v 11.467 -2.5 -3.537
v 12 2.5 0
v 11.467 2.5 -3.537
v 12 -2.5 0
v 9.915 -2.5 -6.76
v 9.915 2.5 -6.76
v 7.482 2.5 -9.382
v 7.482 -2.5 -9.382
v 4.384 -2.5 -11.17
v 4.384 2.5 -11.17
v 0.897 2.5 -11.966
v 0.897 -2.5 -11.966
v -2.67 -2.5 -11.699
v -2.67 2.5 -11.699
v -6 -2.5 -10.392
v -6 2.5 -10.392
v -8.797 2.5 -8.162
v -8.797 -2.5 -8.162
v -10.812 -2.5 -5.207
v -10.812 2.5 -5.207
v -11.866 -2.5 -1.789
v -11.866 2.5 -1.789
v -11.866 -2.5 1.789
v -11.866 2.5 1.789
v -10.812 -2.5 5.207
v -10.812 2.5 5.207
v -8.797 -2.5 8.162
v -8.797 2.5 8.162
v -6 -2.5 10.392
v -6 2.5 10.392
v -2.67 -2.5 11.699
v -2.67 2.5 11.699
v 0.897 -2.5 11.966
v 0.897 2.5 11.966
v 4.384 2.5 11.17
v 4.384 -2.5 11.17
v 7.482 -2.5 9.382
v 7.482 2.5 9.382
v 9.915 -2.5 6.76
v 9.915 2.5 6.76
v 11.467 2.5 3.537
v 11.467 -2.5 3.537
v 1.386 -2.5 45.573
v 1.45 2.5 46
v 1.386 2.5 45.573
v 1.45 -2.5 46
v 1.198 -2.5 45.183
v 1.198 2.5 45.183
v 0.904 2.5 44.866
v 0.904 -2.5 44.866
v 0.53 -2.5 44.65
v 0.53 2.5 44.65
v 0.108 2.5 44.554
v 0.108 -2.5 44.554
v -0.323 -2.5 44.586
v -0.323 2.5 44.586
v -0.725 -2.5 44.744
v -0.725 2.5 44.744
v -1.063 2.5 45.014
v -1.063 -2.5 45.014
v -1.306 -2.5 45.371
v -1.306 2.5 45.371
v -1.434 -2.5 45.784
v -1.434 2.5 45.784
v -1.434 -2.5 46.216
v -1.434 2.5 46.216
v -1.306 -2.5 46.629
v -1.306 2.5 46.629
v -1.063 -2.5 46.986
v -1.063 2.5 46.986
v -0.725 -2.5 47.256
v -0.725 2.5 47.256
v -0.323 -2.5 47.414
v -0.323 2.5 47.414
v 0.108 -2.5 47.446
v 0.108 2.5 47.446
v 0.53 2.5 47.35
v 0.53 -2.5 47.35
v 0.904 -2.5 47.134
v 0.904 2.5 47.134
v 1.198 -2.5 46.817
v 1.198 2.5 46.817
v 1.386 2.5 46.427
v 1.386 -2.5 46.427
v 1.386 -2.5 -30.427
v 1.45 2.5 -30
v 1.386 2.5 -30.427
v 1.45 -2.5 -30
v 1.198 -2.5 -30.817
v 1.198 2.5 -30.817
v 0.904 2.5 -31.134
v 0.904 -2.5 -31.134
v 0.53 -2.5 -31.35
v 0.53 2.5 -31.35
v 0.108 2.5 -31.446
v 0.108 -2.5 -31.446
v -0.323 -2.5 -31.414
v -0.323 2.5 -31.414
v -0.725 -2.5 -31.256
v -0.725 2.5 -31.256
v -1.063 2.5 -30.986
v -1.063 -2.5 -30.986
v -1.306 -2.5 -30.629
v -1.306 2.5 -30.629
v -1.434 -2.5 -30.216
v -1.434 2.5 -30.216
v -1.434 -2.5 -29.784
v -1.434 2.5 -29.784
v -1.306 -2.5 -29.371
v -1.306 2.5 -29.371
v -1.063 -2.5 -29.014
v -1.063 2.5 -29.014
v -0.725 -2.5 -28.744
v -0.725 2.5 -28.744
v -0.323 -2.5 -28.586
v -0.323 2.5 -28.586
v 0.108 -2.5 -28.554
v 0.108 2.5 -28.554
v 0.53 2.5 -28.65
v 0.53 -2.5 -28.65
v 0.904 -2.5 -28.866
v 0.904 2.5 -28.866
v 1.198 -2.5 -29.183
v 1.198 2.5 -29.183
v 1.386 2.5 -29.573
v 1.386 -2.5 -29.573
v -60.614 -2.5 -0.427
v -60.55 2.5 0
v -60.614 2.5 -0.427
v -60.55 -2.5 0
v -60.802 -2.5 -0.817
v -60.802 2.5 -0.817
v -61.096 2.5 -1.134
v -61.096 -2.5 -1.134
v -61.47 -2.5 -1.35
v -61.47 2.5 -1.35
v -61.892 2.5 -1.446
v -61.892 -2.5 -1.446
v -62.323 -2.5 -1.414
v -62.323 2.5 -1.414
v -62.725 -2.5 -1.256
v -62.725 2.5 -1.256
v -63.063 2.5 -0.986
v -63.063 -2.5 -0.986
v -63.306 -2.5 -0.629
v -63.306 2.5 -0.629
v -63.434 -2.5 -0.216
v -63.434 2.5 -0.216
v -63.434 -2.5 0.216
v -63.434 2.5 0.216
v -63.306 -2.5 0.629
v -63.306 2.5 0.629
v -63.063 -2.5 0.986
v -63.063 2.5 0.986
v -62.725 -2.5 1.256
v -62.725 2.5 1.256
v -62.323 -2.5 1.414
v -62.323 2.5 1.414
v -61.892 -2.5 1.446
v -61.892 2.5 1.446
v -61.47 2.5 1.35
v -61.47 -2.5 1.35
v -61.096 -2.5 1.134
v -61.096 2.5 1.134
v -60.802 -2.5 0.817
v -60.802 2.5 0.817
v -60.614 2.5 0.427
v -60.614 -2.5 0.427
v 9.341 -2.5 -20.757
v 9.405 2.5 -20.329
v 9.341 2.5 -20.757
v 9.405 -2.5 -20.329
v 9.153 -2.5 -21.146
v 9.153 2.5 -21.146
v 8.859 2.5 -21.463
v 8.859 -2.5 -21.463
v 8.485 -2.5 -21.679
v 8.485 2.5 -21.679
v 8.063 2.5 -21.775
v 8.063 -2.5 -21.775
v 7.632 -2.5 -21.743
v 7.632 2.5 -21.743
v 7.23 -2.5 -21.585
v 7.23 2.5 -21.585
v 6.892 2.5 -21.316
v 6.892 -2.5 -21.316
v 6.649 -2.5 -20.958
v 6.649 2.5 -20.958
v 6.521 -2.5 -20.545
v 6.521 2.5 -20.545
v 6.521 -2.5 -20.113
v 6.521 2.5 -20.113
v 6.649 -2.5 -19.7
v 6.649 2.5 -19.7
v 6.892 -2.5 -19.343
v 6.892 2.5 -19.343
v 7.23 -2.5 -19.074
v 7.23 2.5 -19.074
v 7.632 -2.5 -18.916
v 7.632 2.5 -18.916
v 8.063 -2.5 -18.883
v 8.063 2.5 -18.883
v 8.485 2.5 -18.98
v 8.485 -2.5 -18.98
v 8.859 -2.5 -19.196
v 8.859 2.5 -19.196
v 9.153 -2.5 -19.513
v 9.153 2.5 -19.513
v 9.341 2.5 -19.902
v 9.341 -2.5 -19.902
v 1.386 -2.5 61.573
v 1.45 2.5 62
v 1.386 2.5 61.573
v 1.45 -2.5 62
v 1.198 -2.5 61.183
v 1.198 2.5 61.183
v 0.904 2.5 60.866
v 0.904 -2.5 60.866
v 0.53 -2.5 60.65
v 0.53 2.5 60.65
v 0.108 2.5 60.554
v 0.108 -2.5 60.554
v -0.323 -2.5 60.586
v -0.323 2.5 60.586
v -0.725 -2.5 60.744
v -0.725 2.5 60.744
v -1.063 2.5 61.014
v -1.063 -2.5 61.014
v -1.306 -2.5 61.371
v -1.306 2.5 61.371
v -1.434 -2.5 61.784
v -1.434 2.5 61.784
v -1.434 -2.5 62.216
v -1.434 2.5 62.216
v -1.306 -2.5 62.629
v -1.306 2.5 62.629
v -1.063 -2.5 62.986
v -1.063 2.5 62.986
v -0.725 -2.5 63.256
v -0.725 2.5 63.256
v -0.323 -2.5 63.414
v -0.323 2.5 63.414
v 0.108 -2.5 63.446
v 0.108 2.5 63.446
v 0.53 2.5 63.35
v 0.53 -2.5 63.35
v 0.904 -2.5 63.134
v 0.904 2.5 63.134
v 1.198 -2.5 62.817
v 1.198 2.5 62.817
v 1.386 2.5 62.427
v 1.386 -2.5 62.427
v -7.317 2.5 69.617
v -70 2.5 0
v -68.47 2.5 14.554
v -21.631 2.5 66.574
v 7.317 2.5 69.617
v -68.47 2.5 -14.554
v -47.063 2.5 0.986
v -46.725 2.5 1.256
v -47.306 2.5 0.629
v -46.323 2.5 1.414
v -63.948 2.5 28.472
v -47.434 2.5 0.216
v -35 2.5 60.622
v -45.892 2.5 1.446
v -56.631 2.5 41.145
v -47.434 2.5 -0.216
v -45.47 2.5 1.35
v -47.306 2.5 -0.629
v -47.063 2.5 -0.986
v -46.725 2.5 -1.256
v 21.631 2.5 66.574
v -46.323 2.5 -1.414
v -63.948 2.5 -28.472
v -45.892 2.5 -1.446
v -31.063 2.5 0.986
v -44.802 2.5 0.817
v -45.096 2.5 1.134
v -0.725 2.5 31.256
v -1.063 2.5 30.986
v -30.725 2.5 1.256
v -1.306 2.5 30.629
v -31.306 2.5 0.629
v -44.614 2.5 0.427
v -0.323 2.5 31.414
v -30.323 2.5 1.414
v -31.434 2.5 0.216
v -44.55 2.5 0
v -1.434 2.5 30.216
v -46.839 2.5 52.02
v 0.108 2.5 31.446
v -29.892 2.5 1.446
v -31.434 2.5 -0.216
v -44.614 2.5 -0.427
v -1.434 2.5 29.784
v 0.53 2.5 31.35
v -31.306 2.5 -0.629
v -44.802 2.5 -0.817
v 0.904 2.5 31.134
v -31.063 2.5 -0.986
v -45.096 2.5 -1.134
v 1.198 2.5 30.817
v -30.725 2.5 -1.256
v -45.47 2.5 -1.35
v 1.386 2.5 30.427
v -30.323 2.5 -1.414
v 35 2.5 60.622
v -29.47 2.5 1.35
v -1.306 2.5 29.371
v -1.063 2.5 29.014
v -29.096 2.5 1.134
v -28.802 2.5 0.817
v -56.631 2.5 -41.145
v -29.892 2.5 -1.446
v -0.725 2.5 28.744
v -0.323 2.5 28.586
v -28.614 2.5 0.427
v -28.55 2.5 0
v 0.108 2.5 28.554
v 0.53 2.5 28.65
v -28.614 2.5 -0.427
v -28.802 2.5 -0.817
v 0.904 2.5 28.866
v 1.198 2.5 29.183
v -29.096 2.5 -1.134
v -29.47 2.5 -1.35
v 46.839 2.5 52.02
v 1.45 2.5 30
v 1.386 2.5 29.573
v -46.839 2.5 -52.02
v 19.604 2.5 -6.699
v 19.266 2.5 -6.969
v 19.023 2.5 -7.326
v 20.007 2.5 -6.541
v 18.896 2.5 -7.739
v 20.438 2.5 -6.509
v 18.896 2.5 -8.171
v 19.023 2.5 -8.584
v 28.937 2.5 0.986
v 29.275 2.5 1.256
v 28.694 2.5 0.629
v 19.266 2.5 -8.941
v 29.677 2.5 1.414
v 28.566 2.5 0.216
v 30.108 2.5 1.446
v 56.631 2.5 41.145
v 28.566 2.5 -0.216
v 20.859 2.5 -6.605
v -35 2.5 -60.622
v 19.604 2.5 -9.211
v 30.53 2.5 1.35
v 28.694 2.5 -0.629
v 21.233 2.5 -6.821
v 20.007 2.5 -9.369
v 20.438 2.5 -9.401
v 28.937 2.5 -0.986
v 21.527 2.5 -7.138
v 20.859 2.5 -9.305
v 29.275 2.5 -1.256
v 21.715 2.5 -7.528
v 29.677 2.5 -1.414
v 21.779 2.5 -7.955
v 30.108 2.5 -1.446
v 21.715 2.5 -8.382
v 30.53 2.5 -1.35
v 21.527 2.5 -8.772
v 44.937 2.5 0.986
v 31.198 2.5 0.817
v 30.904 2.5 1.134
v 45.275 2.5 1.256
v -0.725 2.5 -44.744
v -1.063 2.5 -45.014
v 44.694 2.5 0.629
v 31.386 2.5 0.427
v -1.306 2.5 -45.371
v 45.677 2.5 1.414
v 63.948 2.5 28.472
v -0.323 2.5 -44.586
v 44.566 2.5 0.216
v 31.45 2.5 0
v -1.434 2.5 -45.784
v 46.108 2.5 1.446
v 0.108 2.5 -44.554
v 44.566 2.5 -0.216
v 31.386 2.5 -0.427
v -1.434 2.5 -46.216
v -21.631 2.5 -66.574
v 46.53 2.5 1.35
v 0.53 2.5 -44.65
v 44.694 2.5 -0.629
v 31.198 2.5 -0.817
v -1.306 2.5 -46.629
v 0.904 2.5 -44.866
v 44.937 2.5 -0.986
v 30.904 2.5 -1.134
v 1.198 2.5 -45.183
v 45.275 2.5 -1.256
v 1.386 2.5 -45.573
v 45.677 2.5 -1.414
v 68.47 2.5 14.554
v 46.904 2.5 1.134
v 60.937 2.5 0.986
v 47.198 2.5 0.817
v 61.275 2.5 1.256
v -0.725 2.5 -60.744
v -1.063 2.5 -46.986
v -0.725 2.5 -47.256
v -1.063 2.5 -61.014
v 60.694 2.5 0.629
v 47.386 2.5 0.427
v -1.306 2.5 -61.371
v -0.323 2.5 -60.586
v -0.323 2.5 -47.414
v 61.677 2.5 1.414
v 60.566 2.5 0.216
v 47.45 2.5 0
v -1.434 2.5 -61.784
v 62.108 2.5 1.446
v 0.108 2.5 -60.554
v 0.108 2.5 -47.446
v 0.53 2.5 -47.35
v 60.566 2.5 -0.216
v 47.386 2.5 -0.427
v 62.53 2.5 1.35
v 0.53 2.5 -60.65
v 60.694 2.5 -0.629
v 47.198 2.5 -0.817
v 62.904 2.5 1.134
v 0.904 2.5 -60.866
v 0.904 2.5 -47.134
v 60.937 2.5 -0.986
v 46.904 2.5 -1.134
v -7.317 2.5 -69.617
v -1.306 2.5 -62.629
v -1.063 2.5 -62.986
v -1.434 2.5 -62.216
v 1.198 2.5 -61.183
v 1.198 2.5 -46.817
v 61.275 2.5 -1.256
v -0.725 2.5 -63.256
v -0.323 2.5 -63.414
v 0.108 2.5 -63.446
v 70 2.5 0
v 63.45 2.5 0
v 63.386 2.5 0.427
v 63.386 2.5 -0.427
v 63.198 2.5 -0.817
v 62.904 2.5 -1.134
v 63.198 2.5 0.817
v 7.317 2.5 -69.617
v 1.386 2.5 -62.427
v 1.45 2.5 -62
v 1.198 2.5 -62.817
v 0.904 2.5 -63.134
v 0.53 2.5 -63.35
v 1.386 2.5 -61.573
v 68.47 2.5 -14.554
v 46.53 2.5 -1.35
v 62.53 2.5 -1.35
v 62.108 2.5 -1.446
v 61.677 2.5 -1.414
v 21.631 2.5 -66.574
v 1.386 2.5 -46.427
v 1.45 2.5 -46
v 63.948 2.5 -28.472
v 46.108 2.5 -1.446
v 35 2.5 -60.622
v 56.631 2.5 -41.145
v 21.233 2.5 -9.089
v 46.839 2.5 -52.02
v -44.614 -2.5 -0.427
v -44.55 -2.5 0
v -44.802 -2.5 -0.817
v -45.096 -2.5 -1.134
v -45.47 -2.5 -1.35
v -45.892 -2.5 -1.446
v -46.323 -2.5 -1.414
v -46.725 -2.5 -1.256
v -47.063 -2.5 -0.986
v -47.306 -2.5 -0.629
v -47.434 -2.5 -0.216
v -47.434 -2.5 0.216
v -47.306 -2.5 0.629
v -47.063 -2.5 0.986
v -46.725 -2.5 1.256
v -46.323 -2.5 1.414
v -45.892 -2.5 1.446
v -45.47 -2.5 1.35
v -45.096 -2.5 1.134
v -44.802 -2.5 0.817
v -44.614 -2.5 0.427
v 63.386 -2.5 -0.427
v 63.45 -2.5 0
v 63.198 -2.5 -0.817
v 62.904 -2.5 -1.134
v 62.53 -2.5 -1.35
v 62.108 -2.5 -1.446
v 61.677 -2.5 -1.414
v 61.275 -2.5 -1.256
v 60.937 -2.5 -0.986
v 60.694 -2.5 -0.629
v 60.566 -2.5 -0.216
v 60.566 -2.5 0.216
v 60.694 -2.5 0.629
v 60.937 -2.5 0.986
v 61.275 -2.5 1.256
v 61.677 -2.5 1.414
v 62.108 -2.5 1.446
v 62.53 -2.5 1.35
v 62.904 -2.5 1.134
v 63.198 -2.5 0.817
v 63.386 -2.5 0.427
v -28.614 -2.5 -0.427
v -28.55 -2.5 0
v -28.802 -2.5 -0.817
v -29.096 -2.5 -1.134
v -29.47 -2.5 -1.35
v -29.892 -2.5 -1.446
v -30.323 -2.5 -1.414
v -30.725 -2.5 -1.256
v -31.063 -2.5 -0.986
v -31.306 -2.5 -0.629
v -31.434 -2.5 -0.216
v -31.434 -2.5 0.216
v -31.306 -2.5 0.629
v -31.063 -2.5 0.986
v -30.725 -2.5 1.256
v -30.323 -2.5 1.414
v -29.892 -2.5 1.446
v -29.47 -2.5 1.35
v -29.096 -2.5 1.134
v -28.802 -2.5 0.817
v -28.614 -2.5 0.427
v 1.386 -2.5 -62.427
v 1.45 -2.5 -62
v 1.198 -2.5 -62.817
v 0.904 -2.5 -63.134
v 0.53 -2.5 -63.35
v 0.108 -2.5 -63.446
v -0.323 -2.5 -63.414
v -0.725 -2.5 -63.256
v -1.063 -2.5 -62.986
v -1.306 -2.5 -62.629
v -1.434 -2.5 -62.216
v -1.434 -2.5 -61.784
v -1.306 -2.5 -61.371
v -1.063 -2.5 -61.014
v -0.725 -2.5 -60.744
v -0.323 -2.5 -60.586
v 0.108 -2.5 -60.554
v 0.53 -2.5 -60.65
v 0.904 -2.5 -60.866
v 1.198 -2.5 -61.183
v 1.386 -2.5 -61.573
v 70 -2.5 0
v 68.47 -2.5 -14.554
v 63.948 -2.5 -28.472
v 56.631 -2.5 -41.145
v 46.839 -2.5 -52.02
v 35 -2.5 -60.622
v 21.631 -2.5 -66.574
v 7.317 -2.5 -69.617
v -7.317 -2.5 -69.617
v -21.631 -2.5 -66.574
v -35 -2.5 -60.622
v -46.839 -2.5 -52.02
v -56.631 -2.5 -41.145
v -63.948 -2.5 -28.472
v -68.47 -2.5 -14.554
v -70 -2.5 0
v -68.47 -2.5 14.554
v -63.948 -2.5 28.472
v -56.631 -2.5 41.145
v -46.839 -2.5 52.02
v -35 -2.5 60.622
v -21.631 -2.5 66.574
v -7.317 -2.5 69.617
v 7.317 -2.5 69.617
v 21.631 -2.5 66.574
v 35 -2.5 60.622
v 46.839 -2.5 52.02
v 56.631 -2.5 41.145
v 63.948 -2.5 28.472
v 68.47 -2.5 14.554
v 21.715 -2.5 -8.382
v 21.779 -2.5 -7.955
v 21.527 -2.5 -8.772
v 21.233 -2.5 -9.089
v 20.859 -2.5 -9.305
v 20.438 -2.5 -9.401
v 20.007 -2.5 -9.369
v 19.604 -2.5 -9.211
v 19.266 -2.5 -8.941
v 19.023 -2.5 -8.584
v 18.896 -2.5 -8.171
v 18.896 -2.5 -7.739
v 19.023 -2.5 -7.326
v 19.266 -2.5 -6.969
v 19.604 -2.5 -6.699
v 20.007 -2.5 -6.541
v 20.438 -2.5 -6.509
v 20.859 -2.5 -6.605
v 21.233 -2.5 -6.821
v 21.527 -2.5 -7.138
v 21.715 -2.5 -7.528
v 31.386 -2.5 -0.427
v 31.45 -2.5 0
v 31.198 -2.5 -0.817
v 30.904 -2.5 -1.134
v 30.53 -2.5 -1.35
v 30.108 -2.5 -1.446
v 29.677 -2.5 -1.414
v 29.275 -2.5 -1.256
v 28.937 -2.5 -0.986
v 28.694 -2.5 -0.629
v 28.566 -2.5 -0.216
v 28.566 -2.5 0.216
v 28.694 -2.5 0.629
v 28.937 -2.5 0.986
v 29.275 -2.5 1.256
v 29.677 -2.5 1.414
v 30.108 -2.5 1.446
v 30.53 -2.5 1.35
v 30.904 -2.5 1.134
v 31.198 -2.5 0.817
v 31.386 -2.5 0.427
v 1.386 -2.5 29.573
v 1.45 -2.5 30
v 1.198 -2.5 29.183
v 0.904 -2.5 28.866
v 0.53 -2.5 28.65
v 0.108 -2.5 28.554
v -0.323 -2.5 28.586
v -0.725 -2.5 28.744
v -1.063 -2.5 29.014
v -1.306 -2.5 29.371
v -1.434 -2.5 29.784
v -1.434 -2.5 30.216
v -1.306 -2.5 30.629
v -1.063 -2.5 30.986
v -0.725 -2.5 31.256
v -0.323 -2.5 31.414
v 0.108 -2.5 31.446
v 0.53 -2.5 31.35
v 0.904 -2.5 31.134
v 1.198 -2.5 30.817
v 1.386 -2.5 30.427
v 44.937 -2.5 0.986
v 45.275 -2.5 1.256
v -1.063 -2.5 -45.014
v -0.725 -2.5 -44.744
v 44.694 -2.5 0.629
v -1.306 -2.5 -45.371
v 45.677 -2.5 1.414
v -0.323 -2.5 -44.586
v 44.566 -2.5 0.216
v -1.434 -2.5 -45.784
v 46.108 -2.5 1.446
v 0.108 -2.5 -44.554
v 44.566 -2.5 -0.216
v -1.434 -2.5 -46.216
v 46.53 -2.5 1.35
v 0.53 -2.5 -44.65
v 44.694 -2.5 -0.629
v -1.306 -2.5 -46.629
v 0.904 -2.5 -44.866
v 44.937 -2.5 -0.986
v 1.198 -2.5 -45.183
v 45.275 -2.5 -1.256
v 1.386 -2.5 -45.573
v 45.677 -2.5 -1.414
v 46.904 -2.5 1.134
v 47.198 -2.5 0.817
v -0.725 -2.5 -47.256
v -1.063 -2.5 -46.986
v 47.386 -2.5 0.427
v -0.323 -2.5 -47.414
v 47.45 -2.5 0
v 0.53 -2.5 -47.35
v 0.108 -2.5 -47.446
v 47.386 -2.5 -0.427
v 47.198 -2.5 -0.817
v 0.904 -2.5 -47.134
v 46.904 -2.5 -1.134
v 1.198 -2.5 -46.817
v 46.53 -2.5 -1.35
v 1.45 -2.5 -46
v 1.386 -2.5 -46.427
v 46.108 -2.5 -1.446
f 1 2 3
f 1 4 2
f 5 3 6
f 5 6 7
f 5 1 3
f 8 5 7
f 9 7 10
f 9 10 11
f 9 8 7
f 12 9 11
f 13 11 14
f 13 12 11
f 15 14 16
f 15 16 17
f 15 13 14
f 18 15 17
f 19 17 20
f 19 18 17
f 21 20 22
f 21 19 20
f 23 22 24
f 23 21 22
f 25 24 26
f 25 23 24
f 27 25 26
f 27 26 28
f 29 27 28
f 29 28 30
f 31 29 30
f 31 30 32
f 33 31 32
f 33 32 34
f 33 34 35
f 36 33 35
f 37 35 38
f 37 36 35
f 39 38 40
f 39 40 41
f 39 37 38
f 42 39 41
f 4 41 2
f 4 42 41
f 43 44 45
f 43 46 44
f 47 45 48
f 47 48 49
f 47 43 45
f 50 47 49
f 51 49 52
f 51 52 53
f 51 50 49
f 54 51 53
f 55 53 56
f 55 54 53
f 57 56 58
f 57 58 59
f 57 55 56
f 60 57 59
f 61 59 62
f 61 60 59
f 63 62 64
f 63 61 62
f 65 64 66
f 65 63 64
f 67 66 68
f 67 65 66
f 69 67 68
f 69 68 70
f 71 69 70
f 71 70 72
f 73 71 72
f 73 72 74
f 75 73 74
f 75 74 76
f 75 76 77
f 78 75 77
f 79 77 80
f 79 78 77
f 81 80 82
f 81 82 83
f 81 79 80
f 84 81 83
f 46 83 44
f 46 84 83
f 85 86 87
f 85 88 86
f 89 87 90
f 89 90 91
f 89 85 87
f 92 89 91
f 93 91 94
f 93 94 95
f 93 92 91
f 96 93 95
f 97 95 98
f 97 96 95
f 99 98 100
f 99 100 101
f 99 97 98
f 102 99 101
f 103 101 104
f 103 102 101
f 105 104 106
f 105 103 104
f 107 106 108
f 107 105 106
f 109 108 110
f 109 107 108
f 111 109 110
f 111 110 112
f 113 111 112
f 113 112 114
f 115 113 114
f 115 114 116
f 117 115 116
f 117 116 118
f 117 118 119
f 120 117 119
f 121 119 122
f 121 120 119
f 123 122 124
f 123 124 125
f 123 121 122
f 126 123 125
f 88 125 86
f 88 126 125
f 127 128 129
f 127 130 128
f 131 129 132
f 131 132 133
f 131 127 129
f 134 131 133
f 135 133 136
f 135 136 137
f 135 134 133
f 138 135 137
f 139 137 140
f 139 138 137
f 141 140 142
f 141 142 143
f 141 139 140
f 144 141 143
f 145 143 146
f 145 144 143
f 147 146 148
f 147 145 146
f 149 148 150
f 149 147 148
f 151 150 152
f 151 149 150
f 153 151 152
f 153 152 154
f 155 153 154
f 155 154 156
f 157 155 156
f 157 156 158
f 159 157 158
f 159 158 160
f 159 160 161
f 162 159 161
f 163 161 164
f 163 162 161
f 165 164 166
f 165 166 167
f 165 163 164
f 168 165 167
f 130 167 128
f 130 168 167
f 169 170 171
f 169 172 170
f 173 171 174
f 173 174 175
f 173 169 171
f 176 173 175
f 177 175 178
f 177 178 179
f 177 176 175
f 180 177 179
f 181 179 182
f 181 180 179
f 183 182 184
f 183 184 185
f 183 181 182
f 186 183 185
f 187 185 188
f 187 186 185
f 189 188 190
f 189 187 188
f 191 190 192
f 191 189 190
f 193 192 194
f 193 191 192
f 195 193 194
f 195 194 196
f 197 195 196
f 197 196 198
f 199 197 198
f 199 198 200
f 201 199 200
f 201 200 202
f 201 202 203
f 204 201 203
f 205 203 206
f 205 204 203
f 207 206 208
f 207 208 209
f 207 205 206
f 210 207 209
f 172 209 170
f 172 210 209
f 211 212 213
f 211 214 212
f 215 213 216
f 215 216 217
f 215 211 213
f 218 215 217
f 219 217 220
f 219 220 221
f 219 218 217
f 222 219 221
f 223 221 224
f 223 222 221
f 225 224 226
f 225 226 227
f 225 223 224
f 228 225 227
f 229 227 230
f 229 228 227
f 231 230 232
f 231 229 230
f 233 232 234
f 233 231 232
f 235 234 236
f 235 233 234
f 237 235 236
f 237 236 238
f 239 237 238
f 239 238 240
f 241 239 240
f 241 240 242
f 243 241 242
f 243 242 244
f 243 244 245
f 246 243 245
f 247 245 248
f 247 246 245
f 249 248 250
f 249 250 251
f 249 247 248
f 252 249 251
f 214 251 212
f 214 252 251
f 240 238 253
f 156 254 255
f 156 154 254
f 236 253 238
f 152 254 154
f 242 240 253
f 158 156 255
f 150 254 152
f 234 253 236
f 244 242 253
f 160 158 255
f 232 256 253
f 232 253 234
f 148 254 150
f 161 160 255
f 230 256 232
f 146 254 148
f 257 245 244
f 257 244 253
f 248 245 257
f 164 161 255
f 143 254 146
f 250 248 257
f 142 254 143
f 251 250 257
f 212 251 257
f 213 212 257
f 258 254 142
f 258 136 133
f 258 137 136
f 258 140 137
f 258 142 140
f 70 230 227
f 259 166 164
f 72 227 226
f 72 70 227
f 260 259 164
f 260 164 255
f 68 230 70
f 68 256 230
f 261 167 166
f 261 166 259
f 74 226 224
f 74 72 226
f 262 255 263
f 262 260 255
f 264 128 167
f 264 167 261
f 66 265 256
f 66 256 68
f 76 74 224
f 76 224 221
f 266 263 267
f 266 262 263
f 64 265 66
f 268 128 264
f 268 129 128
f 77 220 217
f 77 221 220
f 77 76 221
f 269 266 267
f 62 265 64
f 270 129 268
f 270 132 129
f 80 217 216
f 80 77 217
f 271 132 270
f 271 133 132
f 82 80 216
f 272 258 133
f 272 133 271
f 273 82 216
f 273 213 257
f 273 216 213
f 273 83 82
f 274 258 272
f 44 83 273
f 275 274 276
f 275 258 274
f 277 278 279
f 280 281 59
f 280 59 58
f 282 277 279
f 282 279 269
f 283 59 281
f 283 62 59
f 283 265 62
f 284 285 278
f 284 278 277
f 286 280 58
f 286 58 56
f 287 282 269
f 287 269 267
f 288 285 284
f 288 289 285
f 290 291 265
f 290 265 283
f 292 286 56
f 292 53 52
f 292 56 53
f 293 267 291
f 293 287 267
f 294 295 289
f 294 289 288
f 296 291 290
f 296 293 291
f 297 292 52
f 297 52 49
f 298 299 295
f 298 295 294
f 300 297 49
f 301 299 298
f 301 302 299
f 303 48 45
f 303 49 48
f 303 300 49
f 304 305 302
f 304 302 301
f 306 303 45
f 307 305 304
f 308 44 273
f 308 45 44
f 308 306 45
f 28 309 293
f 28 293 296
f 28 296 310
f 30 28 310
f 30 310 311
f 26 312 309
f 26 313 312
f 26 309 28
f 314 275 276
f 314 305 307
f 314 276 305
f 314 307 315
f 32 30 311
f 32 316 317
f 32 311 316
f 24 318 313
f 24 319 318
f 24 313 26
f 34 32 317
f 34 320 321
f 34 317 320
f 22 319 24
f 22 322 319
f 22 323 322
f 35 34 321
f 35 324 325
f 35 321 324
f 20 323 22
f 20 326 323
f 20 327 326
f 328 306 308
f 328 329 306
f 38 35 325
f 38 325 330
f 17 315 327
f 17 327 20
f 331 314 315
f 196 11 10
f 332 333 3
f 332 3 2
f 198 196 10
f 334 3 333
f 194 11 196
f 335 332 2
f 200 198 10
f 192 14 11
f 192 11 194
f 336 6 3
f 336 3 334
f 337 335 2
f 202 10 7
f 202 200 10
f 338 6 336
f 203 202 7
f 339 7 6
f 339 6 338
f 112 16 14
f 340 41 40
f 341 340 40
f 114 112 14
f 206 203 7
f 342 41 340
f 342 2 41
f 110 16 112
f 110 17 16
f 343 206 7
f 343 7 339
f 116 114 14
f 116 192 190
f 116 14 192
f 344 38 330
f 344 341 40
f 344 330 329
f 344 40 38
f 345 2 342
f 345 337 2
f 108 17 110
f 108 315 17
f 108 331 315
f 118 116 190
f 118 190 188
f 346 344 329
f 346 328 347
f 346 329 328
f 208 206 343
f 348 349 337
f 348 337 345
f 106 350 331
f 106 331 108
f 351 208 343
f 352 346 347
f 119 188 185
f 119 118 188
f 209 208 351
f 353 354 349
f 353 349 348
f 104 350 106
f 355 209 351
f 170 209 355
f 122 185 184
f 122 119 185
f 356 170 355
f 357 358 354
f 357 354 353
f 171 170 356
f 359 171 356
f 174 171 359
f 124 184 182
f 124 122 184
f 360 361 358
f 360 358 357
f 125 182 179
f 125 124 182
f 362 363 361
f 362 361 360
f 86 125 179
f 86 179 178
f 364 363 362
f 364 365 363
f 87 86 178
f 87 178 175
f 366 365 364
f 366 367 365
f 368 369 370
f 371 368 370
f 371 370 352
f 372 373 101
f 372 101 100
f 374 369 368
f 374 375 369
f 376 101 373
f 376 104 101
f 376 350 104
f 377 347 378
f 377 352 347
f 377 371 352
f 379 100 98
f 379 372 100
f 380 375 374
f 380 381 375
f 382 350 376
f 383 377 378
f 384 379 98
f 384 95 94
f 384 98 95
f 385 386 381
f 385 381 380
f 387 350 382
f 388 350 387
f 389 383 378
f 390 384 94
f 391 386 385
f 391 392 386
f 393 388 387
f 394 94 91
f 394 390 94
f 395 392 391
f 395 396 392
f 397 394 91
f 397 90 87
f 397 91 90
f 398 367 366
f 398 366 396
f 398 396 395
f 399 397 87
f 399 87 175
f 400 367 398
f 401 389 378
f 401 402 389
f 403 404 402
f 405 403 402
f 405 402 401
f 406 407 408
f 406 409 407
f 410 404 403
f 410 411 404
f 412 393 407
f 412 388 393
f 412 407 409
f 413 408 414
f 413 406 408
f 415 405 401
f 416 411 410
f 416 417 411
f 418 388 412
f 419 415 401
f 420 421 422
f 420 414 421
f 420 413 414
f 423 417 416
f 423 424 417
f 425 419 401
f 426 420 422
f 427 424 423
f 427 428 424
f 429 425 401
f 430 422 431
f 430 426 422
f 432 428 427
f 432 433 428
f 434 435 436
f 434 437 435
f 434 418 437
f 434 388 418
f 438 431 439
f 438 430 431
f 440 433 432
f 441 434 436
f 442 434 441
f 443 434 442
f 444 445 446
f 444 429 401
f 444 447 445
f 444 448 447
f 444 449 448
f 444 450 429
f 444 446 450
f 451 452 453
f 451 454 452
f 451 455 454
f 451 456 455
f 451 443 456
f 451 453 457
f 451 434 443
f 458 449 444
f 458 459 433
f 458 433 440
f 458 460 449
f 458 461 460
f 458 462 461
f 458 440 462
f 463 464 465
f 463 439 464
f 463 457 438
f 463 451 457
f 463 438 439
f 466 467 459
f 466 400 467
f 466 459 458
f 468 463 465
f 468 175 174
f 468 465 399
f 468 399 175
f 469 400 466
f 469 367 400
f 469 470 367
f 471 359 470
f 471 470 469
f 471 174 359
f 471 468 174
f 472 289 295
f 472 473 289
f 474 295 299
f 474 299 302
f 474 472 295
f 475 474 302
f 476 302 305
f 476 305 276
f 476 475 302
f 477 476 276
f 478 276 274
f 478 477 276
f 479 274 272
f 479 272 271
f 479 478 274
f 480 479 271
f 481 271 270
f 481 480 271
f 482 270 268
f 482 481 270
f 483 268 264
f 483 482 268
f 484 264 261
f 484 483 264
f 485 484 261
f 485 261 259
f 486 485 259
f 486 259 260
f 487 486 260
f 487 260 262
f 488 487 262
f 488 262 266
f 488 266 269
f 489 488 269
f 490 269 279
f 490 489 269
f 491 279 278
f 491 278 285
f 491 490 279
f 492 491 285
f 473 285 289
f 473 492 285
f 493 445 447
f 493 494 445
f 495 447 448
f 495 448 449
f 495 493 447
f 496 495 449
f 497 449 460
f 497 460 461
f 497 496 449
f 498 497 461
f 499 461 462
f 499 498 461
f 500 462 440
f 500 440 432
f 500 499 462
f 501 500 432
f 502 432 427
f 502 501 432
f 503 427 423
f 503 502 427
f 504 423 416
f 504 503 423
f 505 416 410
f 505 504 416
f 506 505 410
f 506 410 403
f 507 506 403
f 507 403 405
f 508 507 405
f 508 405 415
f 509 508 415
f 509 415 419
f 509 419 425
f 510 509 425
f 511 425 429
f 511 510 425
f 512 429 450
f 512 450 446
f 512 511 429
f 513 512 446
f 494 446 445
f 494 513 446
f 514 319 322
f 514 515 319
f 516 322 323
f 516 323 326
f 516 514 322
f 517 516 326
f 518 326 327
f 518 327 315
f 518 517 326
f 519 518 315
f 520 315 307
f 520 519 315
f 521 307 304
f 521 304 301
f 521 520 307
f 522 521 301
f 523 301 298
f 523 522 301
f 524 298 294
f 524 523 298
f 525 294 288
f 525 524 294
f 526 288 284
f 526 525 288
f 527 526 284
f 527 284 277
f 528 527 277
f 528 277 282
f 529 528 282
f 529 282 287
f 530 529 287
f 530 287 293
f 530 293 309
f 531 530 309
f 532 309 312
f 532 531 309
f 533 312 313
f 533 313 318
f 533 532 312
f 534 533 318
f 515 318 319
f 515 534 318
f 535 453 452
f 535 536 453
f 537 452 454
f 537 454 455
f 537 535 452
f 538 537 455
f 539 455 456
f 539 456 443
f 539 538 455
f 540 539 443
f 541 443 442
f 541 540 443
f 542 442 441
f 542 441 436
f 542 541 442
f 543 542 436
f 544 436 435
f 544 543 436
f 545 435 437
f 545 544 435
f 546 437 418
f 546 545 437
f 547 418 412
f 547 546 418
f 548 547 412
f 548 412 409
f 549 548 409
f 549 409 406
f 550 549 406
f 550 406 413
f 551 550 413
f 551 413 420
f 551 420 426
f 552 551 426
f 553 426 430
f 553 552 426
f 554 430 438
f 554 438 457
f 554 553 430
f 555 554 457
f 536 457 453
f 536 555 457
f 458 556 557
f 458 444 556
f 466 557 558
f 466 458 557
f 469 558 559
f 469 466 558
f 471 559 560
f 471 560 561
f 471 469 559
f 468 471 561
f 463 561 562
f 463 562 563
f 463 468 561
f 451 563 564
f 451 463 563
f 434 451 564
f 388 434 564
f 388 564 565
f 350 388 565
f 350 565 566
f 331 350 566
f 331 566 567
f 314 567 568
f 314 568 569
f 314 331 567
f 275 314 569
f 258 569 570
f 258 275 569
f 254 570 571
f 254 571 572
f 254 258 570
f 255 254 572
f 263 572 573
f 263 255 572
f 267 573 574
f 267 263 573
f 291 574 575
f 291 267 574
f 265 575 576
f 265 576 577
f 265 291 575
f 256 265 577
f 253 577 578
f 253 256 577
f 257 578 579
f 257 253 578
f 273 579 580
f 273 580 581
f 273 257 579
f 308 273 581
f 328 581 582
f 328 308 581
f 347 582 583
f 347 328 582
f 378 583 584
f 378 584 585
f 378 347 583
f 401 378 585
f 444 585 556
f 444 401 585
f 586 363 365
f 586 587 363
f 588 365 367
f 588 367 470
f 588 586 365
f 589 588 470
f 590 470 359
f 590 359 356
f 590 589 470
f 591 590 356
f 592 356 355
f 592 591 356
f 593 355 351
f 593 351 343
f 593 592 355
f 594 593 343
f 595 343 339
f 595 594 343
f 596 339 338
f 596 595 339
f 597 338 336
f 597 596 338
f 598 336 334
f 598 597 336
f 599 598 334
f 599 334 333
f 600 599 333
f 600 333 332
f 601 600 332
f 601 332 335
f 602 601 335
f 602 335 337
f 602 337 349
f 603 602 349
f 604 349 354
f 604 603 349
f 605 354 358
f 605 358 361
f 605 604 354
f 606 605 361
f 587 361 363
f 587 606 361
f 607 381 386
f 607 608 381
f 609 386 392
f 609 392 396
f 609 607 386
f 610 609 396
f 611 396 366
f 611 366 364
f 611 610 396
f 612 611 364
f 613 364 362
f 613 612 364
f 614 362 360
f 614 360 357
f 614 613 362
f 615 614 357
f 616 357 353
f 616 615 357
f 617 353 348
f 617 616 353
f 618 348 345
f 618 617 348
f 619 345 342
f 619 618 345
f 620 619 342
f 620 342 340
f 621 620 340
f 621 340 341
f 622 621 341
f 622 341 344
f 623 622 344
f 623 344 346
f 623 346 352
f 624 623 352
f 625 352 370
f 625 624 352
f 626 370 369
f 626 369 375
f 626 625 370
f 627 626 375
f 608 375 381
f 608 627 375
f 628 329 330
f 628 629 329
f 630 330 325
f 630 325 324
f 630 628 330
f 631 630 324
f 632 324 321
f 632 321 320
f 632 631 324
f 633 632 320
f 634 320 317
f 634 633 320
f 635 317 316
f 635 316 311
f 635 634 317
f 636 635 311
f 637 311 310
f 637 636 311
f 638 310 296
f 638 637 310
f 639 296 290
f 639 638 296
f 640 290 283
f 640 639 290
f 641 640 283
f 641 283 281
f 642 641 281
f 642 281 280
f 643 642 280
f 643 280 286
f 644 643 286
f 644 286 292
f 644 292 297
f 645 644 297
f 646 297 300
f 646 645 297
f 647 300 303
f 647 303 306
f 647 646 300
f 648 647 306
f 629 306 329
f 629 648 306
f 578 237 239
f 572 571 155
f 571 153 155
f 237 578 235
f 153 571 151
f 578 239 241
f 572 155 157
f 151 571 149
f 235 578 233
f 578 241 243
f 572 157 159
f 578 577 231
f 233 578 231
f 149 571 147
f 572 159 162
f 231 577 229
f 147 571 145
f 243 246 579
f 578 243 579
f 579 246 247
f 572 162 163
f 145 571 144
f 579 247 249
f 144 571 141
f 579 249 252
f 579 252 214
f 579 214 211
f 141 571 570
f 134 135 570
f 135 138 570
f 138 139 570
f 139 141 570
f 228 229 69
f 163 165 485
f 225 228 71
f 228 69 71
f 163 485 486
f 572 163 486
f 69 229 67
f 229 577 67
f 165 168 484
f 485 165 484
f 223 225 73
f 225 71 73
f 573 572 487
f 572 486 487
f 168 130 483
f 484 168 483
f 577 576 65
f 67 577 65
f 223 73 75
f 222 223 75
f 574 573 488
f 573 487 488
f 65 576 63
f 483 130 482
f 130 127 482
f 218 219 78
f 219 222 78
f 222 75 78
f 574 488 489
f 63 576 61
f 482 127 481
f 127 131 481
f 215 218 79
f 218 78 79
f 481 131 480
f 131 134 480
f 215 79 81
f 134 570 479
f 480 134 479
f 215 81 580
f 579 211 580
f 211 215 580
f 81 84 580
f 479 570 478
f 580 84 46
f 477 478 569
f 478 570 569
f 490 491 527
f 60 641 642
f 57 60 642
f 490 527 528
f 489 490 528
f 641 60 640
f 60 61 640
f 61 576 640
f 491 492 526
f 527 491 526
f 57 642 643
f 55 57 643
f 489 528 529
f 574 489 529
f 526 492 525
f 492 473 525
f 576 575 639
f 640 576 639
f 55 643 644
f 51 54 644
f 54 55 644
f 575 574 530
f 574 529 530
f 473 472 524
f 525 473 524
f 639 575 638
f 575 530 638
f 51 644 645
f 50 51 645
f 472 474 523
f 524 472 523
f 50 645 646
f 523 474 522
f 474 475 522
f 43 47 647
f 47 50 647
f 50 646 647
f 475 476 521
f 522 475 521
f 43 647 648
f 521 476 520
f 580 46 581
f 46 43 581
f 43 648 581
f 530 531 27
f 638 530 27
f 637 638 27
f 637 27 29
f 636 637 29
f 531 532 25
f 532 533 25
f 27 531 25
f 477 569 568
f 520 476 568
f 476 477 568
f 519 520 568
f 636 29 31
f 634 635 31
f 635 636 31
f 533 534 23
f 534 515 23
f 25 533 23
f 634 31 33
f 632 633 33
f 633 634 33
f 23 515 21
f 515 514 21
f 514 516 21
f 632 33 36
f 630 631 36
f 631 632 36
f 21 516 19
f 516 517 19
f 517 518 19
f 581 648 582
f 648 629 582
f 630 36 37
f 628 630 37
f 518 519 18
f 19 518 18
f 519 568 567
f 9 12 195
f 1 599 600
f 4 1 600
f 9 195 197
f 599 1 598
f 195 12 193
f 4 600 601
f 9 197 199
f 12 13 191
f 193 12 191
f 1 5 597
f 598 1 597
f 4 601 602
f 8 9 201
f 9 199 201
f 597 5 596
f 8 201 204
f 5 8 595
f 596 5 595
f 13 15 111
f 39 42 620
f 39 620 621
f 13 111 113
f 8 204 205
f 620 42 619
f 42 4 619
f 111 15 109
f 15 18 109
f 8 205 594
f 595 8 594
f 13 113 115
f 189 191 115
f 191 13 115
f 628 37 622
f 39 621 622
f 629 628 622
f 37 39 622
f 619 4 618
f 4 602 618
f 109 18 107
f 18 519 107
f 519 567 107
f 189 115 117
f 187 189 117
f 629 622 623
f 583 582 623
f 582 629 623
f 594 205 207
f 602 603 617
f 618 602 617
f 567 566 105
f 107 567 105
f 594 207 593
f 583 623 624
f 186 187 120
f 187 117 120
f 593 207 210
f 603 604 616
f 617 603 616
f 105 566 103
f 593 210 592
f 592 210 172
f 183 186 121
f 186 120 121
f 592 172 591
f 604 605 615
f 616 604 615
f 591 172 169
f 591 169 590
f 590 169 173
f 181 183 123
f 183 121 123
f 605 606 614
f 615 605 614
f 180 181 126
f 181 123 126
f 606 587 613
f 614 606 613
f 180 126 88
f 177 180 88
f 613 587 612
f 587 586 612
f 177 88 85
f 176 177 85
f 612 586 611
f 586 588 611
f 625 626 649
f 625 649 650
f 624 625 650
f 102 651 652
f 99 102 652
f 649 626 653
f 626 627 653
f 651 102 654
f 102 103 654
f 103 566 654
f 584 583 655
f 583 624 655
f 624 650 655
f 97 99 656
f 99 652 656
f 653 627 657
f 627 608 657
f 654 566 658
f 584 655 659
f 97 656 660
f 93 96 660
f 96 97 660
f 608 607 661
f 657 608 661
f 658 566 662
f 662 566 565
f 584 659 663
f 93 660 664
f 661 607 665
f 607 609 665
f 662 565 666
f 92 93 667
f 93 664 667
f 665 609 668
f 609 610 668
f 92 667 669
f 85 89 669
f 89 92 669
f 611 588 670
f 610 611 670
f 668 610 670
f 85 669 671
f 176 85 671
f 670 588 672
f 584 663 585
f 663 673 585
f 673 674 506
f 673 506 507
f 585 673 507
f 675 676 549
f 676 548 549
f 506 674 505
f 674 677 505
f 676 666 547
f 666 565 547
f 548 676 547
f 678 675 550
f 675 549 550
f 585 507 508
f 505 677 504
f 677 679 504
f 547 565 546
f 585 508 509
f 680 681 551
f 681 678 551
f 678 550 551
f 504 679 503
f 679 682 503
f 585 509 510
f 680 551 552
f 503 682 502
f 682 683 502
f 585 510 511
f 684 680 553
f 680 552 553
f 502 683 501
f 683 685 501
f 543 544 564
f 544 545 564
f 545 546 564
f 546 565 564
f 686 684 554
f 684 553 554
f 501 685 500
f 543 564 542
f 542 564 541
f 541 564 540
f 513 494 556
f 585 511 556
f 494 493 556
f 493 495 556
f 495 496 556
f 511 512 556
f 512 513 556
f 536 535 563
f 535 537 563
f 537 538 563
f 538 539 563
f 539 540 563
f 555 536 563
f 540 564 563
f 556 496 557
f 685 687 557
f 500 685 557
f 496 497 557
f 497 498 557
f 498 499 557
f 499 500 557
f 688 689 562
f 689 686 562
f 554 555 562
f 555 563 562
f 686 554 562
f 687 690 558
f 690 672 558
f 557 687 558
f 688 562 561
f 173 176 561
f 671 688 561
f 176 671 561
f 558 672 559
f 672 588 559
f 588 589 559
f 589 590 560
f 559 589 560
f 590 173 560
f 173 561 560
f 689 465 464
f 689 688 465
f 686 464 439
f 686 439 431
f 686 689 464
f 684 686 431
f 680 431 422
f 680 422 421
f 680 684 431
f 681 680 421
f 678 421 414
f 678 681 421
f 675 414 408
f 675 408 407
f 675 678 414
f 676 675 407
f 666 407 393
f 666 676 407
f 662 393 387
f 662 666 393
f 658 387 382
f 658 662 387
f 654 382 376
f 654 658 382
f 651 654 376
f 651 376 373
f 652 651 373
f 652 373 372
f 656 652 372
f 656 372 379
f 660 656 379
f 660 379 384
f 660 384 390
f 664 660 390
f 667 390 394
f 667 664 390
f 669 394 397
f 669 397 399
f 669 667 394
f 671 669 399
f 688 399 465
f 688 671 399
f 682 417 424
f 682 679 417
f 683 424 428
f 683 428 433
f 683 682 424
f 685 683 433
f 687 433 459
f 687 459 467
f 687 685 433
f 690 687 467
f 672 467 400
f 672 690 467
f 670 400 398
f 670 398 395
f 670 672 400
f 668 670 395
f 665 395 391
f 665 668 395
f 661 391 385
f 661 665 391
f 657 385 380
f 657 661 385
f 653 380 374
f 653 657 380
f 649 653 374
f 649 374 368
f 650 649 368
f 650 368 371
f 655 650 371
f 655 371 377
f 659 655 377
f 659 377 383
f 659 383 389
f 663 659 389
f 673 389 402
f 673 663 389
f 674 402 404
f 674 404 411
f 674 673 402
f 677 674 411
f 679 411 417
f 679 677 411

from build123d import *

# Parameters (mm, degrees)
SKETCH_1_R      = 70
SKETCH_1_R_2    = 1.45
SKETCH_1_R_3    = 12
EXTRUDE_1_DEPTH = 2.5


with BuildPart() as part:
    # 草图1 → 凸台-拉伸1 (new body, symmetric)
    with BuildSketch(Plane(origin=(0, 0, 0), x_dir=(1, 0, 0), z_dir=(0, 1, 0))):
        Circle(SKETCH_1_R)
        with Locations((7.954951288, 20.329319959)):
            Circle(SKETCH_1_R_2, mode=Mode.SUBTRACT)
        with Locations((20.329319959, 7.954951288)):
            Circle(SKETCH_1_R_2, mode=Mode.SUBTRACT)
        Circle(SKETCH_1_R_3, mode=Mode.SUBTRACT)
        with Locations((30, 0)):
            Circle(SKETCH_1_R_2, mode=Mode.SUBTRACT)
        with Locations((46, 0)):
            Circle(SKETCH_1_R_2, mode=Mode.SUBTRACT)
        with Locations((62, 0)):
            Circle(SKETCH_1_R_2, mode=Mode.SUBTRACT)
        with Locations((0, 30)):
            Circle(SKETCH_1_R_2, mode=Mode.SUBTRACT)
        with Locations((0, 46)):
            Circle(SKETCH_1_R_2, mode=Mode.SUBTRACT)
        with Locations((0, 62)):
            Circle(SKETCH_1_R_2, mode=Mode.SUBTRACT)
        with Locations((-30, 0)):
            Circle(SKETCH_1_R_2, mode=Mode.SUBTRACT)
        with Locations((-46, 0)):
            Circle(SKETCH_1_R_2, mode=Mode.SUBTRACT)
        with Locations((-62, 0)):
            Circle(SKETCH_1_R_2, mode=Mode.SUBTRACT)
        with Locations((0, -30)):
            Circle(SKETCH_1_R_2, mode=Mode.SUBTRACT)
        with Locations((0, -46)):
            Circle(SKETCH_1_R_2, mode=Mode.SUBTRACT)
        with Locations((0, -62)):
            Circle(SKETCH_1_R_2, mode=Mode.SUBTRACT)
    extrude(amount=EXTRUDE_1_DEPTH, both=True)


solid = part.part
